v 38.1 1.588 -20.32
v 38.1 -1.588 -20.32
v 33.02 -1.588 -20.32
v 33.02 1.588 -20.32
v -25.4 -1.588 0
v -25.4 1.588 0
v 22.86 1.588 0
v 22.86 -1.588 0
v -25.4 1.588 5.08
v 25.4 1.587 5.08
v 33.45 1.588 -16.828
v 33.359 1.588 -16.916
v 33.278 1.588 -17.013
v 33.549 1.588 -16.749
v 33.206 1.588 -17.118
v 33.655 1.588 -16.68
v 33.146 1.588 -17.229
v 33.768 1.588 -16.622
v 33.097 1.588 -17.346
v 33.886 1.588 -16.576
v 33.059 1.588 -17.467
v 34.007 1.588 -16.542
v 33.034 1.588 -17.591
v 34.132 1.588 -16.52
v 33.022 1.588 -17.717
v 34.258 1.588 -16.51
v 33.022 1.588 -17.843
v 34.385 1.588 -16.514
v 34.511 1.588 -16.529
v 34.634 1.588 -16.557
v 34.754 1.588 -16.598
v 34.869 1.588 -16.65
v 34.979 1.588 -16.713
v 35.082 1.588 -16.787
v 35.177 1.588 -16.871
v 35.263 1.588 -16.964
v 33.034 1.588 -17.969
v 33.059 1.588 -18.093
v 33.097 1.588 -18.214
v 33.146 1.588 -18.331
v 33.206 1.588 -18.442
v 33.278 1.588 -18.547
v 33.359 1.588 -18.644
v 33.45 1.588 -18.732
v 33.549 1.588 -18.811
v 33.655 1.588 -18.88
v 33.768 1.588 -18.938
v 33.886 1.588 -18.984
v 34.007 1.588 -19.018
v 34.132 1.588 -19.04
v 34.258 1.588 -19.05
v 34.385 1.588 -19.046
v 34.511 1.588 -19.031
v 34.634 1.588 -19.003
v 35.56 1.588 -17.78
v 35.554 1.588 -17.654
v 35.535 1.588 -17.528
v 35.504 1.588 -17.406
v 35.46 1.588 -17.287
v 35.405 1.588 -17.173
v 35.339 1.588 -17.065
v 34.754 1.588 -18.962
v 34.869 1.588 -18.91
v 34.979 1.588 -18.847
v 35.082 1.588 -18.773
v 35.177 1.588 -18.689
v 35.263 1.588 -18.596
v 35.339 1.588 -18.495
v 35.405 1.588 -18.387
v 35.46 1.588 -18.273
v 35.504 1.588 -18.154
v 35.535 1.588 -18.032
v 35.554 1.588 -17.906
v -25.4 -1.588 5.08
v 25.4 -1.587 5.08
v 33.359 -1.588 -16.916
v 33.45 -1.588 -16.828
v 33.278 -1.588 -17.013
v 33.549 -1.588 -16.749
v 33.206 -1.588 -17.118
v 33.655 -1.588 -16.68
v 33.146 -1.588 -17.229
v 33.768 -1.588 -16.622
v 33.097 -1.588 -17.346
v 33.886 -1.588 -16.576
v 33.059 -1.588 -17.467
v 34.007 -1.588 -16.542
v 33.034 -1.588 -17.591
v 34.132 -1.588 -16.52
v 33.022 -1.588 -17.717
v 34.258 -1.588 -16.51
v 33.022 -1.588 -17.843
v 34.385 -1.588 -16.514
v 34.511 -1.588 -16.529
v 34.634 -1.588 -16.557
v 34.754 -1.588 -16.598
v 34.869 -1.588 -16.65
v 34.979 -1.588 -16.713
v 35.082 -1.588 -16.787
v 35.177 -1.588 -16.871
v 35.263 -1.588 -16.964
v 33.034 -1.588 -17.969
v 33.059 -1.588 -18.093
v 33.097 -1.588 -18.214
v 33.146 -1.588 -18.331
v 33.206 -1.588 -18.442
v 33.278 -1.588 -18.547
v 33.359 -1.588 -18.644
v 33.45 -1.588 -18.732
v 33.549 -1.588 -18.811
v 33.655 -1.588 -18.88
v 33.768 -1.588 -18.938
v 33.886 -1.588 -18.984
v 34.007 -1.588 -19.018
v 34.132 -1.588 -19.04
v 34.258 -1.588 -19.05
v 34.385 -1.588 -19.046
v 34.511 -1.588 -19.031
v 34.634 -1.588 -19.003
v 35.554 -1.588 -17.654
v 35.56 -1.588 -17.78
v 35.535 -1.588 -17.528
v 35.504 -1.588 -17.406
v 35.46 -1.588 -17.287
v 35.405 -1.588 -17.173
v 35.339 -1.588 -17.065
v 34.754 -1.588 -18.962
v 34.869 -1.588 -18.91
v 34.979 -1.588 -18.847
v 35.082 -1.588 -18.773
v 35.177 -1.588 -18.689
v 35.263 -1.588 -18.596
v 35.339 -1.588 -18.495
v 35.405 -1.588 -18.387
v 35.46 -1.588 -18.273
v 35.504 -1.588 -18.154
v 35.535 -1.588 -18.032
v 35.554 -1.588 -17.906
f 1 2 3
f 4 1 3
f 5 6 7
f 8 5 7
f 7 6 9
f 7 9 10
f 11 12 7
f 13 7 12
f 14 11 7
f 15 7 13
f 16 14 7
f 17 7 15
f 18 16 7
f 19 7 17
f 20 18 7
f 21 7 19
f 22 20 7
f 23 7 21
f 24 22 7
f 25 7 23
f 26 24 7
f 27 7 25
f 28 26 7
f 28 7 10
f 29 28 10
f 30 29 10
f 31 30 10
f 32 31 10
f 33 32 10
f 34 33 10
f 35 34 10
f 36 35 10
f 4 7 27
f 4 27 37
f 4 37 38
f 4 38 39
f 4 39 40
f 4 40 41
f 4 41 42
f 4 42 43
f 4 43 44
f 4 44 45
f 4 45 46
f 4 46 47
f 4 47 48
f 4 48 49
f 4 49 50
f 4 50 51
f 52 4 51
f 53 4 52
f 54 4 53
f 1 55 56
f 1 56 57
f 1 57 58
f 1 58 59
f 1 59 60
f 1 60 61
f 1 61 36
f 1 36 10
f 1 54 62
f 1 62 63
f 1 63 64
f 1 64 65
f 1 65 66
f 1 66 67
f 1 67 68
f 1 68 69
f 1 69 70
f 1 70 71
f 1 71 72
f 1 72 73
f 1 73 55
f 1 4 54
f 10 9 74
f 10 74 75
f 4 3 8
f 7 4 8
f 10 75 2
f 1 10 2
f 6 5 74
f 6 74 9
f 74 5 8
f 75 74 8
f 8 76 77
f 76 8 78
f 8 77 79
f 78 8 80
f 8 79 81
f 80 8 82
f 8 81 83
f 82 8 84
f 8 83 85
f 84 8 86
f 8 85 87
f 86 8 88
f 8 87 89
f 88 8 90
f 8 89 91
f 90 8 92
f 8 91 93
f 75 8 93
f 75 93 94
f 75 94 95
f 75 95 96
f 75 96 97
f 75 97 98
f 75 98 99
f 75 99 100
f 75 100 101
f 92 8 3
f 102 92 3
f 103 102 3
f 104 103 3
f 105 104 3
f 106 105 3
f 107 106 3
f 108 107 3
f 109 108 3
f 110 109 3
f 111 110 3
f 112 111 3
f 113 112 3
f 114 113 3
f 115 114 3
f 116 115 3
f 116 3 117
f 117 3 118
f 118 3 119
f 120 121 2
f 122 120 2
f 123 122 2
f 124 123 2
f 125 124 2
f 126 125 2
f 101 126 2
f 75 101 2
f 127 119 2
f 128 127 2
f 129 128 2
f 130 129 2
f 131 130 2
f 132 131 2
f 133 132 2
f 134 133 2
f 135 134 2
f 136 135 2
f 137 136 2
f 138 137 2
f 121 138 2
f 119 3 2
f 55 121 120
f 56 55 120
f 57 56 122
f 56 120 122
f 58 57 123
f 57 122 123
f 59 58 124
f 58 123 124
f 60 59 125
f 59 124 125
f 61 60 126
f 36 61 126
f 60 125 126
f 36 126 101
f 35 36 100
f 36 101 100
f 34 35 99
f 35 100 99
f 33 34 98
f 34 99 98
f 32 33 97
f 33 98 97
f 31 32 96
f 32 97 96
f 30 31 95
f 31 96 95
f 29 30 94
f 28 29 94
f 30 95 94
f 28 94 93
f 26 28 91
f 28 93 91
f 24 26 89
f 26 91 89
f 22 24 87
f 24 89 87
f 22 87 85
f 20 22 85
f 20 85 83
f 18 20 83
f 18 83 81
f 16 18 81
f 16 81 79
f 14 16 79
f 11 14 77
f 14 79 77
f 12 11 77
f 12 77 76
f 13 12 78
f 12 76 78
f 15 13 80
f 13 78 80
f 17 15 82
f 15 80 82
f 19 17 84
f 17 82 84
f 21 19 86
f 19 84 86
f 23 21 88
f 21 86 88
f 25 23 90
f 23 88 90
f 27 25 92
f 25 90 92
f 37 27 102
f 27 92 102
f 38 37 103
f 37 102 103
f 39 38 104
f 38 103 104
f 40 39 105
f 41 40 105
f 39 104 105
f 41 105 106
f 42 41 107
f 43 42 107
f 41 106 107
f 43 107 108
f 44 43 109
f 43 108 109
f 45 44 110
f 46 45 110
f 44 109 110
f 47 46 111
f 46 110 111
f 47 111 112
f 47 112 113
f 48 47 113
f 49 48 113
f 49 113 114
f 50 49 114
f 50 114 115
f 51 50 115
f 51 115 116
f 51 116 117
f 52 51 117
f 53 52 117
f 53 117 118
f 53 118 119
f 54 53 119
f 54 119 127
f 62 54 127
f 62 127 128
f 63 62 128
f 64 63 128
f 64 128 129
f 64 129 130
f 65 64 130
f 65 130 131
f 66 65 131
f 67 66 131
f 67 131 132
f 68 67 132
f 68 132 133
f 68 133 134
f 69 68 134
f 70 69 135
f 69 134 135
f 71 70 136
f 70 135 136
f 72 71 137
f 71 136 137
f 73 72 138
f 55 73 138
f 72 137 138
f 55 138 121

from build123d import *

# Parameters (mm, degrees)
SKETCH1_W           = 50.8
SKETCH1_H           = 3.175
BOSS_EXTRUDE1_DEPTH = 5.08
SKETCH2_R           = 1.27
BOSS_EXTRUDE2_DEPTH = 3.175


with BuildPart() as part:
    # Sketch1 → Boss-Extrude1 (new body)
    with BuildSketch(Plane.XY):
        Rectangle(SKETCH1_W, SKETCH1_H)
    extrude(amount=BOSS_EXTRUDE1_DEPTH)

    # Sketch2 → Boss-Extrude2 (add)
    with BuildSketch(Plane(origin=(0, -1.5875, 0), x_dir=(-1, 0, 0), z_dir=(0, -1, 0))):
        Polygon((-25.4, -5.08), (-38.1, 20.32), (-33.02, 20.32), (-20.32, -5.08), align=None)
        with Locations(Location((-34.29, 17.78, 0), (0, 0, 180))):
            Circle(SKETCH2_R, mode=Mode.SUBTRACT)
    extrude(amount=-BOSS_EXTRUDE2_DEPTH)


solid = part.part
